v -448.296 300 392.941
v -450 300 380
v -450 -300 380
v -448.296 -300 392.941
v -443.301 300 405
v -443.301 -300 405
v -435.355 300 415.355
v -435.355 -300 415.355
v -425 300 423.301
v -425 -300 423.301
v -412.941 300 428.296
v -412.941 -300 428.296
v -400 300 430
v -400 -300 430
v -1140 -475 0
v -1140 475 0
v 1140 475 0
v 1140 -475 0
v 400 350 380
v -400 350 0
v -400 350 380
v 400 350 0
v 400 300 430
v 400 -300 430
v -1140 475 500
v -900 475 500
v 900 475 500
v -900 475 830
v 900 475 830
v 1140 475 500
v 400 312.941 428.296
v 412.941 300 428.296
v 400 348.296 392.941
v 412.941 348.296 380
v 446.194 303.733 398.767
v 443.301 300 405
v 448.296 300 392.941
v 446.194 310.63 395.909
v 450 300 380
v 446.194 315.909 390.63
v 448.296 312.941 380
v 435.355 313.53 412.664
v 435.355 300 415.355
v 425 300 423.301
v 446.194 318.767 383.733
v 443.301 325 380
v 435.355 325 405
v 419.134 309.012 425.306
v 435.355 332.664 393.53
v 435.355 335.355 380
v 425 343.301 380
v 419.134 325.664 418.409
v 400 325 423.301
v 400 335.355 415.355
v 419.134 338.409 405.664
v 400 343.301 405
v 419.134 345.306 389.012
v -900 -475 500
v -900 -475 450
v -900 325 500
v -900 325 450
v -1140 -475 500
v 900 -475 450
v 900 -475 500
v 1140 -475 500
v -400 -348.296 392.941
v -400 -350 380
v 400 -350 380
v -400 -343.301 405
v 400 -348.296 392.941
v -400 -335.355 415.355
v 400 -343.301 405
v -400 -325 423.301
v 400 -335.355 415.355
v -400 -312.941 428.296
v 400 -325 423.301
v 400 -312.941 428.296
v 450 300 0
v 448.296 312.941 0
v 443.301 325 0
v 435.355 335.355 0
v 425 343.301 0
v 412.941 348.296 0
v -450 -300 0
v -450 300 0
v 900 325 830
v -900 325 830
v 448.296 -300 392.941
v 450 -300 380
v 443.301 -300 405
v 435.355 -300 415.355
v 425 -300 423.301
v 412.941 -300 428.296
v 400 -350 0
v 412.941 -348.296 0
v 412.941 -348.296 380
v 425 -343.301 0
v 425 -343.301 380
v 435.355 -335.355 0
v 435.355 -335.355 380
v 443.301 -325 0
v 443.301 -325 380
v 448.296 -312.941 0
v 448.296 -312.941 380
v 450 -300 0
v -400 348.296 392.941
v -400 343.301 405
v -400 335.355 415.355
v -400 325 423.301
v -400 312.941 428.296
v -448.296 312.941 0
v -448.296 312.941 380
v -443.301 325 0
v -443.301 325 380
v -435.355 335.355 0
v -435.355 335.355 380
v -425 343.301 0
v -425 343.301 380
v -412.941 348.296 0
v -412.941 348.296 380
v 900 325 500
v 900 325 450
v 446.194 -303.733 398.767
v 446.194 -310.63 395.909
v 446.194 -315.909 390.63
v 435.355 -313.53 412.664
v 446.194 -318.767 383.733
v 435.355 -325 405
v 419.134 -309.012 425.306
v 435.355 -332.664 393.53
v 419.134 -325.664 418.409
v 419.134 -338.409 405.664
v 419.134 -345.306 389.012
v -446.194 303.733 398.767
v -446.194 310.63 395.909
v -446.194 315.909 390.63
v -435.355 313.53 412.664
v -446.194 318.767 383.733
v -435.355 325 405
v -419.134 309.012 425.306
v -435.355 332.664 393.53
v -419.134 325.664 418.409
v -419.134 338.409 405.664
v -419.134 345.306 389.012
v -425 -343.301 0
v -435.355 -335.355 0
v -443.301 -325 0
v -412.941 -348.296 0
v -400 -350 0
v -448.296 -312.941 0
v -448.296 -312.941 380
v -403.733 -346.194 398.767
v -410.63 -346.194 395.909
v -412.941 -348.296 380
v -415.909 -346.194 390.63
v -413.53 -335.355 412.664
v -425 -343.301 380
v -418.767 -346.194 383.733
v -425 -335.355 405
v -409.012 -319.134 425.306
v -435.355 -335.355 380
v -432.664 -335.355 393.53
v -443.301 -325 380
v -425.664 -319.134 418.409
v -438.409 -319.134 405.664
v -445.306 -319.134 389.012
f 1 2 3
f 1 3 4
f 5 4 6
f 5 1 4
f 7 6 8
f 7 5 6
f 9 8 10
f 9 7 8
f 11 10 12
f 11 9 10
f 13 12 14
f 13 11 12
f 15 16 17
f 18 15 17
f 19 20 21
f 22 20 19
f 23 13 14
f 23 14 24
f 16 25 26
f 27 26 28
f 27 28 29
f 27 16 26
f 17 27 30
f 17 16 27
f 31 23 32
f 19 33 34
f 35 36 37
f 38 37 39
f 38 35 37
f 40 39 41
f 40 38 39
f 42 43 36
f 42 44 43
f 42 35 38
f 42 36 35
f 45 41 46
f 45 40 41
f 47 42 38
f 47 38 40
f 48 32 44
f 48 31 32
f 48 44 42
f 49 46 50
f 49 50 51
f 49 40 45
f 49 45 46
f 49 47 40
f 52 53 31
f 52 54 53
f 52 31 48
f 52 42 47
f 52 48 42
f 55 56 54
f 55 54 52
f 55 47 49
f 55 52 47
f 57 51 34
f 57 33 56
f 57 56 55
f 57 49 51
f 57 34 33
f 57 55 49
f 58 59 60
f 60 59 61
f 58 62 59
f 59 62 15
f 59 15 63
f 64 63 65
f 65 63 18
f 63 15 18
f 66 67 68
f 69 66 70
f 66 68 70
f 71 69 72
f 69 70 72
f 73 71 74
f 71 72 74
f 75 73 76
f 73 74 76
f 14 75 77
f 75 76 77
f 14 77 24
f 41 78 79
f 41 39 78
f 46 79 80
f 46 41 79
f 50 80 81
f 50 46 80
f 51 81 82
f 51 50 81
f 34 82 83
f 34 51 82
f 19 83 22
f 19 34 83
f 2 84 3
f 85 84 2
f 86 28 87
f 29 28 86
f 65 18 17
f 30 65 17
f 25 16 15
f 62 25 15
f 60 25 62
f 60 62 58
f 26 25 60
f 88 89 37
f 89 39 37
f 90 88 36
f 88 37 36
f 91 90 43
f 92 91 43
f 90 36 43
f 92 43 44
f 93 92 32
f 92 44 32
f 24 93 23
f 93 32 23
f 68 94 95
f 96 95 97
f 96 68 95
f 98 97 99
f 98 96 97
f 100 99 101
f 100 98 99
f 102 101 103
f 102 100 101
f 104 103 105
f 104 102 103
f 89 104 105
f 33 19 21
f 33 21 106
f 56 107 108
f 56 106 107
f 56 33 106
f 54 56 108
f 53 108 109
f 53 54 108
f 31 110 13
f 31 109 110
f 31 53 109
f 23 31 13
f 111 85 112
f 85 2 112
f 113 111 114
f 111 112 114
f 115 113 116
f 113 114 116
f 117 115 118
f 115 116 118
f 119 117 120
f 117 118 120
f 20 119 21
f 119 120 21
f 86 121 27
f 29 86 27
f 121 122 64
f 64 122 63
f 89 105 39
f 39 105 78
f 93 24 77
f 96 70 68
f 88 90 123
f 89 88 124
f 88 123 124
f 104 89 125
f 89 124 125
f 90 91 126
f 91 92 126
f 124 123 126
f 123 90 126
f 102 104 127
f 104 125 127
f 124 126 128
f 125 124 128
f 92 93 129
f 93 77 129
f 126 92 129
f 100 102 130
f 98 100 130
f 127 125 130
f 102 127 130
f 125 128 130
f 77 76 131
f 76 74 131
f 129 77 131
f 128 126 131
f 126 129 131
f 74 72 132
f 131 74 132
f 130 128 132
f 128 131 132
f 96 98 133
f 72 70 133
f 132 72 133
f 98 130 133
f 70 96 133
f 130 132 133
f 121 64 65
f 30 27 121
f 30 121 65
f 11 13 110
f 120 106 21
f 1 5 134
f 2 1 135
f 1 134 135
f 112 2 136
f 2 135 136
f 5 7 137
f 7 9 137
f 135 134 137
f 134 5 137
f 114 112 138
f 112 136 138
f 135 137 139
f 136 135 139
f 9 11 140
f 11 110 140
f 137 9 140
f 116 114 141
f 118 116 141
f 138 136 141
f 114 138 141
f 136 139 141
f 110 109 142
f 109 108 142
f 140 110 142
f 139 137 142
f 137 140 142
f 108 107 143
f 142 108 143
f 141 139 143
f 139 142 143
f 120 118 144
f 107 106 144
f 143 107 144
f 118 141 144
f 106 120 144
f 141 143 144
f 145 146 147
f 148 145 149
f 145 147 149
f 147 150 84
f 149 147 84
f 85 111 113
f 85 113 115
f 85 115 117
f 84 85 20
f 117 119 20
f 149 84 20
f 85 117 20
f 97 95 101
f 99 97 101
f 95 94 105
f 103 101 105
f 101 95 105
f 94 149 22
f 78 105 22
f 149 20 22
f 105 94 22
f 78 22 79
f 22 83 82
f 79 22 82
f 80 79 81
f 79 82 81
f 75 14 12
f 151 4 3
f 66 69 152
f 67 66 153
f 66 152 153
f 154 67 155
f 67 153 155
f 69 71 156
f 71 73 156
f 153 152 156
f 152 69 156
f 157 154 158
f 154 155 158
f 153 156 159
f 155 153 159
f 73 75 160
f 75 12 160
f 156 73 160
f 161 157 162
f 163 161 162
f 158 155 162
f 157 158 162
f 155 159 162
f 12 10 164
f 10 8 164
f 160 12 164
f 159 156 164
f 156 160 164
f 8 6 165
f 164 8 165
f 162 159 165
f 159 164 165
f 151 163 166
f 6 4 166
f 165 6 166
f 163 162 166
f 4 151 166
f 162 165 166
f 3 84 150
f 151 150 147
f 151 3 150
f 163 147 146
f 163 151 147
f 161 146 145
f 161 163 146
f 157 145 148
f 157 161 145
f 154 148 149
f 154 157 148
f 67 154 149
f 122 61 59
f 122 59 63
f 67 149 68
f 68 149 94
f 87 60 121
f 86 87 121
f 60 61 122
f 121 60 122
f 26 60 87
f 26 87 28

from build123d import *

# Parameters (mm, degrees)
F1_DEPTH = 500
F0_W     = 1800
F0_H     = 800
F2_DEPTH = 450
F0_H_2   = 150
F3_DEPTH = 830
F4_W     = 900
F4_H     = 700
F5_DEPTH = 430
F6_R     = 50


with BuildPart() as f1:
    # F0 (on Top) → F1 (new body)
    with BuildSketch(Plane.XY):
        Polygon((-1140, 475), (-1140, -475), (-900, -475), (-900, 325), (-900, 475), align=None)
        Polygon((900, 325), (900, -475), (1140, -475), (1140, 475), (900, 475), align=None)
    extrude(amount=F1_DEPTH)

    # F0 (on Top) → F2 (join)
    with BuildSketch(Plane.XY):
        with Locations((0, -75)):
            Rectangle(F0_W, F0_H)
    extrude(amount=F2_DEPTH)

    # F0 (on Top) → F3 (join)
    with BuildSketch(Plane.XY):
        with Locations((0, 400)):
            Rectangle(F0_W, F0_H_2)
    extrude(amount=F3_DEPTH)


with BuildPart() as f5:
    # F4 (on Top) → F5 (new body)
    with BuildSketch(Plane.XY):
        Rectangle(F4_W, F4_H)
    extrude(amount=F5_DEPTH)

    # F6
    f6_edges = [f5.edges().sort_by_distance(p)[0] for p in [
        (0, 350, 430),
        (-450, 0, 430),
        (0, -350, 430),
        (450, 0, 430),
        (-450, -350, 215),
        (450, -350, 215),
        (450, 350, 215),
        (-450, 350, 215),
    ]]
    fillet(f6_edges, radius=F6_R)


solid = Compound([f1.part, f5.part])
